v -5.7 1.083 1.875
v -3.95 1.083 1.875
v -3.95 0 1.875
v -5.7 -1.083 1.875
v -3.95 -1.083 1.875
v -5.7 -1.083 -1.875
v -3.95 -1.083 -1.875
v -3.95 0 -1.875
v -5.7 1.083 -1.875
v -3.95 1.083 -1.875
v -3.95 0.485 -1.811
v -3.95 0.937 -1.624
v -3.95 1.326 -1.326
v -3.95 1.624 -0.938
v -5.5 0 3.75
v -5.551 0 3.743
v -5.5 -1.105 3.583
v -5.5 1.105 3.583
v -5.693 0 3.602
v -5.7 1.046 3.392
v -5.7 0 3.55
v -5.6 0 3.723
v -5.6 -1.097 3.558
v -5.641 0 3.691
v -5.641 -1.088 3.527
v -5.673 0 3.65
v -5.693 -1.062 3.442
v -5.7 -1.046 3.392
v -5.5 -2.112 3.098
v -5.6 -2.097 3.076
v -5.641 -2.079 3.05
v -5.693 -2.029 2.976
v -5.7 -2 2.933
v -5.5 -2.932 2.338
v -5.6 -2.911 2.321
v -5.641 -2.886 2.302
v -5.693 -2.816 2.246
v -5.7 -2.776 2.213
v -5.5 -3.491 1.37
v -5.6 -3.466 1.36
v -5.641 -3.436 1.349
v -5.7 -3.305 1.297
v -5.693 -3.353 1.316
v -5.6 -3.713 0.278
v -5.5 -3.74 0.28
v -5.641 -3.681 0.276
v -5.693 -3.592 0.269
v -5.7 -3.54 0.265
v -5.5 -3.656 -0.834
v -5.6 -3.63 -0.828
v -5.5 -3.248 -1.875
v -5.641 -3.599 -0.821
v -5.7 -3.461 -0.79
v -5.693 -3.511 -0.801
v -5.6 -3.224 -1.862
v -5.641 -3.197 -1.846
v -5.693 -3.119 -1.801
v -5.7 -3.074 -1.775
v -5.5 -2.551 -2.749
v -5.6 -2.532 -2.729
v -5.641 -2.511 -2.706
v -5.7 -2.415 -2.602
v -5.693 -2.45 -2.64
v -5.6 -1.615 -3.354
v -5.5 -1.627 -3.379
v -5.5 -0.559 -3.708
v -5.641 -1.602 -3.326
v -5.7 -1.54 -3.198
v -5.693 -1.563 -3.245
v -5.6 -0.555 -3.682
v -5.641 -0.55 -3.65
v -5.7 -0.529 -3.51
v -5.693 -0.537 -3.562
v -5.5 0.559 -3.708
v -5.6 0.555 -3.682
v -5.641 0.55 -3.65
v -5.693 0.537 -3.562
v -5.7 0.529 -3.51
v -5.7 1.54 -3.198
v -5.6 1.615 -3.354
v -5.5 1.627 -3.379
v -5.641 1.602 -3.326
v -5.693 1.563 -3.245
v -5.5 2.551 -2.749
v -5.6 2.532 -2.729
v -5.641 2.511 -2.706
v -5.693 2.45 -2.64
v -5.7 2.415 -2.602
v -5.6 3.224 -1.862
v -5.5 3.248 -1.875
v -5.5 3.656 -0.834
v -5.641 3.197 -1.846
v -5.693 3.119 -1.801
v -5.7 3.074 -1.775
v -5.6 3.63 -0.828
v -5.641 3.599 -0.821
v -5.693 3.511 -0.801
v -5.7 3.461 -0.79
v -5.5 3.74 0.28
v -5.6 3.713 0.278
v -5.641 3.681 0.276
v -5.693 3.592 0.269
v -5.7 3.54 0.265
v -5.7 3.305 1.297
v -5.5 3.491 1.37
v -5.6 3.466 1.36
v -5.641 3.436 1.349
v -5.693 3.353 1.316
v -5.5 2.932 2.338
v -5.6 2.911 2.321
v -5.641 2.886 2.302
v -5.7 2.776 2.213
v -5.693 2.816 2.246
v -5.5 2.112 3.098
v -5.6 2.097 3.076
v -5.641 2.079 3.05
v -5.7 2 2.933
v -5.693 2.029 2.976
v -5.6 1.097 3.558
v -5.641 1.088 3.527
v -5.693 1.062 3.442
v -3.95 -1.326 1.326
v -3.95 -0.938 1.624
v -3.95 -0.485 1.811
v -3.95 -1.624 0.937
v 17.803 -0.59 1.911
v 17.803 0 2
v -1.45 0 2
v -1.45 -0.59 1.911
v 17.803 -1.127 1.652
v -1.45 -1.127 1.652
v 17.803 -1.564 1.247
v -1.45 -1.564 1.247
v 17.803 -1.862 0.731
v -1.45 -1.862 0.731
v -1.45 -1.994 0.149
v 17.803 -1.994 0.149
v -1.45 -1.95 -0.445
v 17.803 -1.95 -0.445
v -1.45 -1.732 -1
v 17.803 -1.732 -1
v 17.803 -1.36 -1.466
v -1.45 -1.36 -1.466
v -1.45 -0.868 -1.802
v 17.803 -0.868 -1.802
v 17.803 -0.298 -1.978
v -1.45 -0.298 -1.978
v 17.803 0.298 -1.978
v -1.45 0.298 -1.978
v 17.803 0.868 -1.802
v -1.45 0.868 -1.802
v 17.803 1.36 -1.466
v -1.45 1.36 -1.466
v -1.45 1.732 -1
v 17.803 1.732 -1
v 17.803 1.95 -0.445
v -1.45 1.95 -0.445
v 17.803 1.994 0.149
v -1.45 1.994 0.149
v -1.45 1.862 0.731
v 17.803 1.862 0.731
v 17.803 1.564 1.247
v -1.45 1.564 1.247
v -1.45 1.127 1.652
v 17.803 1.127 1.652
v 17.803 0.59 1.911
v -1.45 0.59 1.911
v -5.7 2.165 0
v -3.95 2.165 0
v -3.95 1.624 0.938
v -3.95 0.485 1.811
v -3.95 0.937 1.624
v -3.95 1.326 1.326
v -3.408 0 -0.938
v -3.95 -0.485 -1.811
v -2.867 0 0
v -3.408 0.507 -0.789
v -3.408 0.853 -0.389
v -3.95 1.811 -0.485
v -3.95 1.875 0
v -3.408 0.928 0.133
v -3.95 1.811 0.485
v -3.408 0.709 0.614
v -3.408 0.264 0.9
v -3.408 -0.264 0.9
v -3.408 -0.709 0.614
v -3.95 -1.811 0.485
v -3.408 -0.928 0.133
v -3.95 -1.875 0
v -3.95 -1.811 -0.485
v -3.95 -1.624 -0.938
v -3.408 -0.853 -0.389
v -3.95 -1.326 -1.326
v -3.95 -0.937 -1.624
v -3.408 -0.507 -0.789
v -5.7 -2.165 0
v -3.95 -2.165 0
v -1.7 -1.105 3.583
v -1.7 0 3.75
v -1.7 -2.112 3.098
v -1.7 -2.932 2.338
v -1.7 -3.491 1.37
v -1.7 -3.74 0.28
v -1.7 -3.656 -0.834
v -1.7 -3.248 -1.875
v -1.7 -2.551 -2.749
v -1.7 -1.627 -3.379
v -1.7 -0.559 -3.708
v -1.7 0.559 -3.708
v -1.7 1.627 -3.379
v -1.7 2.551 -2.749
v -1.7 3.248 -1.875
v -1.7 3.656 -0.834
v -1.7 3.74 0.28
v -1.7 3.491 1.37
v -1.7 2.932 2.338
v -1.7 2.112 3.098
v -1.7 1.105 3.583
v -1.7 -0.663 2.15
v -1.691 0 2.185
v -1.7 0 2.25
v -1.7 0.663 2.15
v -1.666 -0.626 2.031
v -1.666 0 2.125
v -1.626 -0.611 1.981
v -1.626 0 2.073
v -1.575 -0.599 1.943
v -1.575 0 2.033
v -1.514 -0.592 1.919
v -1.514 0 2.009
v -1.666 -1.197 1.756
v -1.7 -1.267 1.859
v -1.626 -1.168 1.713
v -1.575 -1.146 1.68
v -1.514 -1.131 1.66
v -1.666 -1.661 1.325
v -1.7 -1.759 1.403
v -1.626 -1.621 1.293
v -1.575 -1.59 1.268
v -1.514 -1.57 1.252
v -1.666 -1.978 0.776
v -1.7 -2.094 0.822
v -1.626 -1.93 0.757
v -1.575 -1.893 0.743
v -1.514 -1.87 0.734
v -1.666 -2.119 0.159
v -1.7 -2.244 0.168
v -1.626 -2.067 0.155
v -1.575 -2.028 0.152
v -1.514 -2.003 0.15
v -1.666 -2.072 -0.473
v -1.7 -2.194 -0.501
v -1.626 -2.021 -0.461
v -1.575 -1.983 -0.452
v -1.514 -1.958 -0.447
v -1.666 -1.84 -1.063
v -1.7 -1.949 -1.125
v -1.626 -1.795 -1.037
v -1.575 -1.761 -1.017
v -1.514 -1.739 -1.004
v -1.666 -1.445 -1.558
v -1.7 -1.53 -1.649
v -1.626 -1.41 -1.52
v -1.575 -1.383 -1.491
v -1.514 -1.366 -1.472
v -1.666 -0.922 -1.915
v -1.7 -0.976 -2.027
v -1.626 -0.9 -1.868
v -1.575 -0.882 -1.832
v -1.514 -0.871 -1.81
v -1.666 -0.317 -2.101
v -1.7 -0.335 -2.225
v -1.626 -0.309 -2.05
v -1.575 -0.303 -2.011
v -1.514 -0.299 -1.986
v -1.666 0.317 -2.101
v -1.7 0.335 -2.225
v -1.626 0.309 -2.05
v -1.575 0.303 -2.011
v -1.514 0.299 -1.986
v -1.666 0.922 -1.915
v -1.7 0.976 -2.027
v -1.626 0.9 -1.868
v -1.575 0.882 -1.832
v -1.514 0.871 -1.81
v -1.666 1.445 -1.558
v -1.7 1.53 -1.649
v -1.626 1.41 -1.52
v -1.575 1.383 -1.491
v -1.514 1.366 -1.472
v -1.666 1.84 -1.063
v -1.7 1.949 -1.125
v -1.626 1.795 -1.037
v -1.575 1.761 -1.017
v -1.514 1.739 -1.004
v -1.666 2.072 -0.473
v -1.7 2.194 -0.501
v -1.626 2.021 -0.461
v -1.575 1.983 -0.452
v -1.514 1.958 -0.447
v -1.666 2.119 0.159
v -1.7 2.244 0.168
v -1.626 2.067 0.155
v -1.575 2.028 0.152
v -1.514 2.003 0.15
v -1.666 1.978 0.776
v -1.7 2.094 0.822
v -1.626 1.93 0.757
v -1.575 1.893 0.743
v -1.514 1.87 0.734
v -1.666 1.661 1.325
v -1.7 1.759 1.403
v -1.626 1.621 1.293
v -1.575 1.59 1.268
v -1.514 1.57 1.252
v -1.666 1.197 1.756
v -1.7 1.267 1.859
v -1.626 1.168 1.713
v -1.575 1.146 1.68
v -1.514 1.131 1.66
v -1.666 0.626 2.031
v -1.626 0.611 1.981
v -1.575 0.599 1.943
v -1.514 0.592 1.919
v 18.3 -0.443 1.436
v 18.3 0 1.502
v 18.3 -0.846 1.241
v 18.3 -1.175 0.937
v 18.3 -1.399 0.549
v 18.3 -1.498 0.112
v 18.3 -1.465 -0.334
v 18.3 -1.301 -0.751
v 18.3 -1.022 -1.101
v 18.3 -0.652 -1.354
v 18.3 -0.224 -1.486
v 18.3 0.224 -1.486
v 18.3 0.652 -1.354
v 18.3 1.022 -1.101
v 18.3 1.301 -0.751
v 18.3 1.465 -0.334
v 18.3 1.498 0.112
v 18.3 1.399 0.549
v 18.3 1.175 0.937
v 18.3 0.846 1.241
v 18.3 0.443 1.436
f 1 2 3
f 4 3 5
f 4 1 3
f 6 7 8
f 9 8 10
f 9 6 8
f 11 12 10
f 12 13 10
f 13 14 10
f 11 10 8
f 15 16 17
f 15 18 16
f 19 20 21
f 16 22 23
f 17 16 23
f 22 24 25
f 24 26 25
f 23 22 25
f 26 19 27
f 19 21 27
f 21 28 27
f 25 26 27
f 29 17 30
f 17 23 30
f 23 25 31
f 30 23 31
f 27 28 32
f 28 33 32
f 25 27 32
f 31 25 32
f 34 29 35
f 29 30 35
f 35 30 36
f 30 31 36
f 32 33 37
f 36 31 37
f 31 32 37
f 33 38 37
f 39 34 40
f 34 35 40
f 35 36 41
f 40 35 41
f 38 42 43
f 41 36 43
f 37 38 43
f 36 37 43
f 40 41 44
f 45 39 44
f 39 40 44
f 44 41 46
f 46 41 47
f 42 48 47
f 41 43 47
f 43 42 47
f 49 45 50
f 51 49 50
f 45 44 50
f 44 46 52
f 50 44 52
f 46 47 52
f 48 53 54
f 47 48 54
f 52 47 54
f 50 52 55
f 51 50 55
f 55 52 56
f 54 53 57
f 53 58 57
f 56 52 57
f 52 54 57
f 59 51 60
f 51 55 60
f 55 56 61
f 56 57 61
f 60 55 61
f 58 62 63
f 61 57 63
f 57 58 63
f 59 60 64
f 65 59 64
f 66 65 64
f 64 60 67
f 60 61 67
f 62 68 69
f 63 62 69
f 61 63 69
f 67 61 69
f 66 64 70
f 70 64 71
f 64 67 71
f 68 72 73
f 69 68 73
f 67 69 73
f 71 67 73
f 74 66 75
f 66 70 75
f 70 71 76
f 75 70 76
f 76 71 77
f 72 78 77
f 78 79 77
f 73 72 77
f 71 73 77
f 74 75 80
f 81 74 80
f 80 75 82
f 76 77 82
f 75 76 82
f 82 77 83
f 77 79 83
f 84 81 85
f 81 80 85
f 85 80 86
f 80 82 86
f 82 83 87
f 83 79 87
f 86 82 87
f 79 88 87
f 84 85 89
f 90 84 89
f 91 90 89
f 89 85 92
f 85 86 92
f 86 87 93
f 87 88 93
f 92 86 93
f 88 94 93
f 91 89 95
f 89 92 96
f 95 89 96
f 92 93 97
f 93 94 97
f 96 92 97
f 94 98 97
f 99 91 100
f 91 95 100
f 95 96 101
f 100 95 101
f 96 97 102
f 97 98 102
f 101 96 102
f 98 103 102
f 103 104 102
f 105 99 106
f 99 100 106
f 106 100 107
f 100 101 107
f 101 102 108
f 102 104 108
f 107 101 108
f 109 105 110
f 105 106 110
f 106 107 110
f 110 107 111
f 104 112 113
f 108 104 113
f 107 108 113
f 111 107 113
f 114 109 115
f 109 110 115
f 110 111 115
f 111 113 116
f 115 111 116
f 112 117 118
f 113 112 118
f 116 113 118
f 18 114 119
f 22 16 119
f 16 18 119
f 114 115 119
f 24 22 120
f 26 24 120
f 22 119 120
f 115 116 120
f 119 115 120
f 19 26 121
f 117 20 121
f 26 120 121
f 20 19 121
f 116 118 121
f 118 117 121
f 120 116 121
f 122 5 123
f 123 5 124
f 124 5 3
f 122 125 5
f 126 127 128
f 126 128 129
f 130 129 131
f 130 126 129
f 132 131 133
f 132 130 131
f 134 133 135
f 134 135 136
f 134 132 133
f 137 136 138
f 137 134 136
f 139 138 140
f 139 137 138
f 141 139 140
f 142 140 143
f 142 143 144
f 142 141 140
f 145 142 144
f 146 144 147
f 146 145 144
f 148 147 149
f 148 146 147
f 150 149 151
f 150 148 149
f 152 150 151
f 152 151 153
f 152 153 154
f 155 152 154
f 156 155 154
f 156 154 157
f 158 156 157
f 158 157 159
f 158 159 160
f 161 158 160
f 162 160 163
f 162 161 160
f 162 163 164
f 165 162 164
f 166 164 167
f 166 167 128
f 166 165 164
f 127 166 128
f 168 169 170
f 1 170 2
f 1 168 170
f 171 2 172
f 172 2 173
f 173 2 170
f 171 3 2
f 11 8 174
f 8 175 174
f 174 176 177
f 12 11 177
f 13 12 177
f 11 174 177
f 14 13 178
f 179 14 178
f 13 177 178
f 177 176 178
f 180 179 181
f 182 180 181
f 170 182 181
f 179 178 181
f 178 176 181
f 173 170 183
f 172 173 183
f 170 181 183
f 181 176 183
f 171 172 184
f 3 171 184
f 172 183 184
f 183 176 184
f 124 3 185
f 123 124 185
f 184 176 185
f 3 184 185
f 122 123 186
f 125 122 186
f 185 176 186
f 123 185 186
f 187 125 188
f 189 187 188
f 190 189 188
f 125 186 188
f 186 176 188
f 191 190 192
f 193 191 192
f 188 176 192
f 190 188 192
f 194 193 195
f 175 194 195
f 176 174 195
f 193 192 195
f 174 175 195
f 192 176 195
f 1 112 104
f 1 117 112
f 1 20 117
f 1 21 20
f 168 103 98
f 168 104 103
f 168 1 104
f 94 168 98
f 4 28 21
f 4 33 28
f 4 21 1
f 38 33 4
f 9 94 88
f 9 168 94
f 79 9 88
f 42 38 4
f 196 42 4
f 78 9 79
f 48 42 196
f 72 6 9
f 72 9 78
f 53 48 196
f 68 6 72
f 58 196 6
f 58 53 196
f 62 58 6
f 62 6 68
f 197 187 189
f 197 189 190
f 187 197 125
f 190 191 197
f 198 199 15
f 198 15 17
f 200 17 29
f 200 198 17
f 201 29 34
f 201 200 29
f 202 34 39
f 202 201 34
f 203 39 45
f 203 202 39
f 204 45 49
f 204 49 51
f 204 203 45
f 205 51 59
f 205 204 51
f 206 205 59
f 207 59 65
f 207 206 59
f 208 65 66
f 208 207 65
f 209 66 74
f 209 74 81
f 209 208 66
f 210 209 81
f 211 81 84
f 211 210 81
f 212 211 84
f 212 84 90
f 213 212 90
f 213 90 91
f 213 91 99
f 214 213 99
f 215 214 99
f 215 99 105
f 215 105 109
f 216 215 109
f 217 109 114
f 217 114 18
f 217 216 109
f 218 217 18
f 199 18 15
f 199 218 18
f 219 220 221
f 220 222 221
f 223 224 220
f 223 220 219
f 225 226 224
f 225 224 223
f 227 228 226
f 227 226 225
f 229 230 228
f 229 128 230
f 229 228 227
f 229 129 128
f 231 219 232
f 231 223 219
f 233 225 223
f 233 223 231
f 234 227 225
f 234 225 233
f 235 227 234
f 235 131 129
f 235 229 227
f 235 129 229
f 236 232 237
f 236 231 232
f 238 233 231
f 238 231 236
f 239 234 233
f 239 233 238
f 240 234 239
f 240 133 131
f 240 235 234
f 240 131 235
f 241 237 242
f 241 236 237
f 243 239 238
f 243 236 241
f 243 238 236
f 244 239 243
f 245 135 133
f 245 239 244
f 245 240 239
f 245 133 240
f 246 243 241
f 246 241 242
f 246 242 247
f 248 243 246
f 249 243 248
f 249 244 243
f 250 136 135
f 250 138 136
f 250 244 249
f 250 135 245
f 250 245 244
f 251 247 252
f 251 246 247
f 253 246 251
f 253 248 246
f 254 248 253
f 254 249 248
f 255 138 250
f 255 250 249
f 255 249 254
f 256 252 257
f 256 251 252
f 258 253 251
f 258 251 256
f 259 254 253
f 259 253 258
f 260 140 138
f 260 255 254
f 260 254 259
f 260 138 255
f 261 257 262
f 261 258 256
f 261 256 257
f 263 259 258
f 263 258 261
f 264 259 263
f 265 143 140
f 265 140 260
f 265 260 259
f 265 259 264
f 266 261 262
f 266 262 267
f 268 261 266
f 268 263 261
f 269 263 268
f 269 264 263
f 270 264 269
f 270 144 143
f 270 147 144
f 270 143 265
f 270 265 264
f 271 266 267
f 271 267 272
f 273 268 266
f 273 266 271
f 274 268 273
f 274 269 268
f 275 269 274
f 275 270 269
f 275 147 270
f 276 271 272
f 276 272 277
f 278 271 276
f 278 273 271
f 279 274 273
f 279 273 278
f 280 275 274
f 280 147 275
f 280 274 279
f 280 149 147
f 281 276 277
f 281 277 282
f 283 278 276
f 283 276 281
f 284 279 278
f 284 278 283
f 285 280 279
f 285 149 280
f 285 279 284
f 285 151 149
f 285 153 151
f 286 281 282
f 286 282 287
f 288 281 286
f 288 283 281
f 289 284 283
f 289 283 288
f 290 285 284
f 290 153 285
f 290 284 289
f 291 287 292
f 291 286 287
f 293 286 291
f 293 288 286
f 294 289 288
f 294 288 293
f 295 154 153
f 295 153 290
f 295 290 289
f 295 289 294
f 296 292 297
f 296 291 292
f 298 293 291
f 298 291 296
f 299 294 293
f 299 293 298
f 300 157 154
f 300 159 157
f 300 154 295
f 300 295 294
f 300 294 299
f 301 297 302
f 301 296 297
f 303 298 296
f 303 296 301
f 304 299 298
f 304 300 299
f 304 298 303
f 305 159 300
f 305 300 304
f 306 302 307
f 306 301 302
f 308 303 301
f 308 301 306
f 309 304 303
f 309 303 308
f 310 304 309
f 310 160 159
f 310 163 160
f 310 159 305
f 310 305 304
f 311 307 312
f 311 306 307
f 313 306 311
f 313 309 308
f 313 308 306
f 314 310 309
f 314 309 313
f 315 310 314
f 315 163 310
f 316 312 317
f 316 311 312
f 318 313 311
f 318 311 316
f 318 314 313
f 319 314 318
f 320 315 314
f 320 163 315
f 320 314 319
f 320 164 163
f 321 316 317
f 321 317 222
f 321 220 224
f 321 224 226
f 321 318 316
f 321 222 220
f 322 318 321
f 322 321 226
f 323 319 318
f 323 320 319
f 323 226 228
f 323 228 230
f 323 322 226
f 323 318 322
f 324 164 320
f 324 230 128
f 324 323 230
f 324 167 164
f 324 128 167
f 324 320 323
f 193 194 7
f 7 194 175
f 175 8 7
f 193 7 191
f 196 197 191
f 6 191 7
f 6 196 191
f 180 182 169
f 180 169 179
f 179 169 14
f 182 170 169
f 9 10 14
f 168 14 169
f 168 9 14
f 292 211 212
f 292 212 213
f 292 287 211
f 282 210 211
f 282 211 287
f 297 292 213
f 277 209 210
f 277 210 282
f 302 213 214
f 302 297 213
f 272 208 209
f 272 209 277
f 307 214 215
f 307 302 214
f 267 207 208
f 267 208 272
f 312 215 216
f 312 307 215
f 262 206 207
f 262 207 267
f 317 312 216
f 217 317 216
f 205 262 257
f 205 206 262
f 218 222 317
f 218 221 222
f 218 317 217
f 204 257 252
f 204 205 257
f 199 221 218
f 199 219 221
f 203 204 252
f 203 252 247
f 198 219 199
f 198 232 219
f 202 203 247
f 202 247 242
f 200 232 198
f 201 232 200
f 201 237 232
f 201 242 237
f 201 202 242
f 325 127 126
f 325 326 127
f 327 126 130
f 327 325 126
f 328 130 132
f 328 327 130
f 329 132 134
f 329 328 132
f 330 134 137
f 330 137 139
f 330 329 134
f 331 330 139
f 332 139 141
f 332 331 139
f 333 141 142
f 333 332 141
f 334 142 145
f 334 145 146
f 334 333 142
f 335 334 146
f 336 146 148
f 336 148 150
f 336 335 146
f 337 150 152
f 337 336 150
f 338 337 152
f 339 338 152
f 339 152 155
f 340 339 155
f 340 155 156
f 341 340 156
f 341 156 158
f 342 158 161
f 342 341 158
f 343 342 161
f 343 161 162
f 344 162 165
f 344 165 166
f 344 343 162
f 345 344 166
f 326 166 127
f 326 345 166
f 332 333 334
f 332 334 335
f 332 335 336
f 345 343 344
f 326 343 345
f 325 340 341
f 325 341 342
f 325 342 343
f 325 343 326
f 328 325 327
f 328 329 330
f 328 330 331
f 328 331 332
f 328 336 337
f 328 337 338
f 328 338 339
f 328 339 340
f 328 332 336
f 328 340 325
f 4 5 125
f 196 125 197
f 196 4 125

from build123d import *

# Parameters (mm, degrees)
FILLET1_R    = 0.1
FILLET2_R    = 0.08
HEX_2_DEPTH  = 0.7
SCALE1_SCALE = 2.5


with BuildPart() as part:
    # BodySke → BaseBody (revolve)
    with BuildSketch(Plane.XY, mode=Mode.PRIVATE) as basebody_sk:
        Polygon((0, 0), (0, 1.5), (1.6, 1.5), (1.6, 0.8), (9.401, 0.8), (9.6, 0.601), (9.6, 0), align=None)
    revolve(basebody_sk.sketch.rotate(Axis((0, 0, 0), (1, 0, 0)), 90), axis=Axis((0, 0, 0), (1, 0, 0)))

    # Fillet1
    fillet1_edges = [part.edges().sort_by_distance(p)[0] for p in [
        (1.6, 0, -0.8),
    ]]
    fillet(fillet1_edges, radius=FILLET1_R)

    # Fillet2
    fillet2_edges = [part.edges().sort_by_distance(p)[0] for p in [
        (0, 0, -1.5),
    ]]
    fillet(fillet2_edges, radius=FILLET2_R)

    # HexSke → Hex 2 (cut)
    with BuildSketch(Plane(origin=(0, 0, 0), x_dir=(0, 0, -1), z_dir=(1, 0, 0))):
        Polygon((0, 0.866025404), (-0.75, 0.433012702), (-0.75, -0.433012702), (0, -0.866025404), (0.75, -0.433012702), (0.75, 0.433012702), align=None)
    extrude(amount=HEX_2_DEPTH, mode=Mode.SUBTRACT)

    # Hex-PreBroachSke → Hex-PreBroach (revolve, cut)
    with BuildSketch(Plane.XY, mode=Mode.PRIVATE) as hex_prebroach_sk:
        Polygon((0, 0), (0, 0.75), (0.7, 0.75), (1.133012702, 0), align=None)
    revolve(hex_prebroach_sk.sketch.rotate(Axis((0, 0, 0), (1, 0, 0)), 270), axis=Axis((0, 0, 0), (1, 0, 0)), mode=Mode.SUBTRACT)


with BuildPart() as part_1:
    # Scale1: scaled about (3.799750462, 0, 0)
    add(part.part.scale(SCALE1_SCALE).moved(Location((-5.699625693, 0, 0))))


solid = part_1.part
